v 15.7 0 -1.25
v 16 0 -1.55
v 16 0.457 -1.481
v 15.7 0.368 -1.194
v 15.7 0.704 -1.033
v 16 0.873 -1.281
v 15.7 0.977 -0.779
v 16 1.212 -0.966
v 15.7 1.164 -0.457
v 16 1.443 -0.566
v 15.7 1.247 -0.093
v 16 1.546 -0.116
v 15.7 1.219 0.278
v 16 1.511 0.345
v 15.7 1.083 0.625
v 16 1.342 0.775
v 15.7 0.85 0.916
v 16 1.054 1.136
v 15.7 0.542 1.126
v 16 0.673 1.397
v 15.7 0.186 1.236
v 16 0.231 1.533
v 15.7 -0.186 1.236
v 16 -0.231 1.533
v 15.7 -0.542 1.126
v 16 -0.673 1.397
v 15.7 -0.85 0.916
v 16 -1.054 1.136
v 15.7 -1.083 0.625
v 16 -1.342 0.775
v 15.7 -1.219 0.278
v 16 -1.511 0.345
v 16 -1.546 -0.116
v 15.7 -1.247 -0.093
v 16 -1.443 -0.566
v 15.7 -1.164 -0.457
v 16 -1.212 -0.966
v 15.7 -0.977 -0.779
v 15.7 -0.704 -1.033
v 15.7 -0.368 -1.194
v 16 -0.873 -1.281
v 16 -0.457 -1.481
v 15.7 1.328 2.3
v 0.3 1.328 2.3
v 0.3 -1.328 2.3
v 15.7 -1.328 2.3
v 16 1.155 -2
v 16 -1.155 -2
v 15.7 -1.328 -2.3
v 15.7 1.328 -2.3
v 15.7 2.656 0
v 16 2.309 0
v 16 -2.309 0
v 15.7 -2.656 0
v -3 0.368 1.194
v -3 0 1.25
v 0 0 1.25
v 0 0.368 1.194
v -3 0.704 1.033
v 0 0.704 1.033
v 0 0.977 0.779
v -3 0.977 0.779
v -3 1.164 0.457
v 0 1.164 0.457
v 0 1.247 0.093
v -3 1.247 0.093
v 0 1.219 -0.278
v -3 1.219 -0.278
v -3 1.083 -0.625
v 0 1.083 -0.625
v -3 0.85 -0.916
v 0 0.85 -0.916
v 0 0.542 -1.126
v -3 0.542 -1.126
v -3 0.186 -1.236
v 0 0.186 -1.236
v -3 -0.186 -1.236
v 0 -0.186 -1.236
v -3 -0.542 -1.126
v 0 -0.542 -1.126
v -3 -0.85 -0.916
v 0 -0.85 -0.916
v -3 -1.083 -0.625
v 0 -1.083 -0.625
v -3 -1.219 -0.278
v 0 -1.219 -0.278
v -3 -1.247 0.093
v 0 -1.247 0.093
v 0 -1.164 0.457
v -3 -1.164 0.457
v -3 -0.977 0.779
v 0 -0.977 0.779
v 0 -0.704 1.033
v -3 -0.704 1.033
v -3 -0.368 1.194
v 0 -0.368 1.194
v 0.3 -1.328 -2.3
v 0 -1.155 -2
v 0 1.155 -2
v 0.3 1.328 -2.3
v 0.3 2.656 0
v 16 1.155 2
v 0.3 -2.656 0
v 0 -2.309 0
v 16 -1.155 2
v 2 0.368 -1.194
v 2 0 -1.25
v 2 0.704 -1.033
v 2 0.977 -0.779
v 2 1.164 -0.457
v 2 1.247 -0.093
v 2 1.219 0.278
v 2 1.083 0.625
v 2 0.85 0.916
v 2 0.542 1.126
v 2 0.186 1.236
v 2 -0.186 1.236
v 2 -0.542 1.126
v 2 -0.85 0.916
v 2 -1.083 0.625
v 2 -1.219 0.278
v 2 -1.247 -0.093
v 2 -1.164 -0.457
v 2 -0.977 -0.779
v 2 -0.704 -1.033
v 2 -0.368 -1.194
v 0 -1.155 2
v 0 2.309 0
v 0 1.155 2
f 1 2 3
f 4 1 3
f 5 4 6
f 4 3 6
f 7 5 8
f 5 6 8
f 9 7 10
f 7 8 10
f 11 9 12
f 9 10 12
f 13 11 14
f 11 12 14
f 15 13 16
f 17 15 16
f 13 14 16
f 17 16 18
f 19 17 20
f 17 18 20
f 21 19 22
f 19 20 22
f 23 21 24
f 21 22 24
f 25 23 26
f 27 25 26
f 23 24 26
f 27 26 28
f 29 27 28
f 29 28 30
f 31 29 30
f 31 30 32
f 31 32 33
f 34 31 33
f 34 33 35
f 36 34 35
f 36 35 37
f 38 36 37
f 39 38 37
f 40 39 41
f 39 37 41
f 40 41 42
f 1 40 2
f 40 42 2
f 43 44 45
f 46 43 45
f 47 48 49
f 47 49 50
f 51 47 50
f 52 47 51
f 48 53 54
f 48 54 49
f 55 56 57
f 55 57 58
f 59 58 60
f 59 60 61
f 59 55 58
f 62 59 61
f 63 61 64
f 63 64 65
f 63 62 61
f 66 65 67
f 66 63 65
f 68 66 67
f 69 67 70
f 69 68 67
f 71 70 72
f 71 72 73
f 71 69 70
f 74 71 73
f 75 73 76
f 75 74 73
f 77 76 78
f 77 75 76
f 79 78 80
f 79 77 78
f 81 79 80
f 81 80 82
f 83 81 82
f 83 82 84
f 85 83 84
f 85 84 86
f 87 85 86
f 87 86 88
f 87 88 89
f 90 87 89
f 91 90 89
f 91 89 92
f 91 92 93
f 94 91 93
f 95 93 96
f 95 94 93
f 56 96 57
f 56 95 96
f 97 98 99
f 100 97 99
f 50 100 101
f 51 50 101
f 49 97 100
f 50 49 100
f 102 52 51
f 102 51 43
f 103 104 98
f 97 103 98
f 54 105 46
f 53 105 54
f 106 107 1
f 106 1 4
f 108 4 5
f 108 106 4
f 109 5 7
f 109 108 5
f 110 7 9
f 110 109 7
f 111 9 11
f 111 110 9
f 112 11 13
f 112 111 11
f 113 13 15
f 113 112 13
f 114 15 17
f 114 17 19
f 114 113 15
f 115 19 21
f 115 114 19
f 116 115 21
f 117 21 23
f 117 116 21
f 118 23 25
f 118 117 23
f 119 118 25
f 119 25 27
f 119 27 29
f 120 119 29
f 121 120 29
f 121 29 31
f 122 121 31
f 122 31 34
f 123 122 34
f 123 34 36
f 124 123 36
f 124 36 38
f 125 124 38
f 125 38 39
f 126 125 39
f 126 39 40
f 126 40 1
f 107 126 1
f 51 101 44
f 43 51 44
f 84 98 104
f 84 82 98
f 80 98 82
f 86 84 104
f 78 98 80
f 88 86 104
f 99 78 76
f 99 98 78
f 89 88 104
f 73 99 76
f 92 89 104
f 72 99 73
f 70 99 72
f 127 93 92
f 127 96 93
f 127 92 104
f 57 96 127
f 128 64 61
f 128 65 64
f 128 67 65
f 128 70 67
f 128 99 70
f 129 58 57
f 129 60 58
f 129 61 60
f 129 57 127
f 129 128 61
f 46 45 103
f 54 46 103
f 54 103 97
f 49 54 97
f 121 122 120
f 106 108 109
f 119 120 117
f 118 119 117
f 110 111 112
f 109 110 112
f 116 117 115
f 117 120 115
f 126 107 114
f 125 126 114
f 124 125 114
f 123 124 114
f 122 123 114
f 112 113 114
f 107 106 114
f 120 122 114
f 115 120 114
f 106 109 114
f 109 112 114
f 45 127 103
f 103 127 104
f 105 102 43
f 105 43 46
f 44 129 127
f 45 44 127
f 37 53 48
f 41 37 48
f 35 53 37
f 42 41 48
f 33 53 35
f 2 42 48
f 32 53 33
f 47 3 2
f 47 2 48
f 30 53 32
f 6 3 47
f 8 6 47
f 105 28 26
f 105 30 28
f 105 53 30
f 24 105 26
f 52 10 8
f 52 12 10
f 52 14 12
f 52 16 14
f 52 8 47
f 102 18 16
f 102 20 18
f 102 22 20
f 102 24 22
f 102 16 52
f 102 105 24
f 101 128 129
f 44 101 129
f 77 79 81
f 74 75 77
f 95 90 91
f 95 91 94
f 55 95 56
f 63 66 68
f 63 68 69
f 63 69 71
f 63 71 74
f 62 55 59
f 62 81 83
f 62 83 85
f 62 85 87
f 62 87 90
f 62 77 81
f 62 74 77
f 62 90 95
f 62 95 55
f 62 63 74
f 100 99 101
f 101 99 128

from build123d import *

# Parameters (mm, degrees)
SKETCH_1_R      = 1.25
EXTRUDE_1_DEPTH = 16
CHAMFER_1_SIZE  = 0.3
SKETCH_2_R      = 1.55
EXTRUDE_2_DEPTH = 2
EXTRUDE_START   = 3
SKETCH_3_R      = 1.25
EXTRUDE_3_DEPTH = 3


with BuildPart() as part:
    # 草图1 → 凸台-拉伸1 (new body)
    with BuildSketch(Plane.YZ):
        Polygon((2.655811238, 0), (1.327905619, 2.3), (-1.327905619, 2.3), (-2.655811238, 0), (-1.327905619, -2.3), (1.327905619, -2.3), align=None)
        with Locations(Location((0, 0, 0), (0, 0, 270))):
            Circle(SKETCH_1_R, mode=Mode.SUBTRACT)
    extrude(amount=EXTRUDE_1_DEPTH)

    # 倒角1
    chamfer_1_edges = [part.edges().sort_by_distance(p)[0] for p in [
        (16, 0, 2.3),
        (16, -1.991858429, 1.15),
        (0, 0, 1.25),
        (16, 0, 1.25),
        (16, -1.991858429, -1.15),
        (16, 0, -2.3),
        (16, 1.991858429, -1.15),
        (0, 0, -2.3),
        (0, -1.991858429, -1.15),
        (0, -1.991858429, 1.15),
        (0, 0, 2.3),
        (0, 1.991858429, 1.15),
        (0, 1.991858429, -1.15),
        (16, 1.991858429, 1.15),
    ]]
    chamfer(chamfer_1_edges, length=CHAMFER_1_SIZE)

    # 草图2 → 凸台-拉伸2 (add)
    with BuildSketch(Plane.ZY):
        Circle(SKETCH_2_R)
    extrude(amount=-EXTRUDE_2_DEPTH)

    # 草图3 → 凸台-拉伸3 (add)
    with BuildSketch(Plane.ZY.offset(EXTRUDE_START)):
        Circle(SKETCH_3_R)
    extrude(amount=-EXTRUDE_3_DEPTH)


solid = part.part
